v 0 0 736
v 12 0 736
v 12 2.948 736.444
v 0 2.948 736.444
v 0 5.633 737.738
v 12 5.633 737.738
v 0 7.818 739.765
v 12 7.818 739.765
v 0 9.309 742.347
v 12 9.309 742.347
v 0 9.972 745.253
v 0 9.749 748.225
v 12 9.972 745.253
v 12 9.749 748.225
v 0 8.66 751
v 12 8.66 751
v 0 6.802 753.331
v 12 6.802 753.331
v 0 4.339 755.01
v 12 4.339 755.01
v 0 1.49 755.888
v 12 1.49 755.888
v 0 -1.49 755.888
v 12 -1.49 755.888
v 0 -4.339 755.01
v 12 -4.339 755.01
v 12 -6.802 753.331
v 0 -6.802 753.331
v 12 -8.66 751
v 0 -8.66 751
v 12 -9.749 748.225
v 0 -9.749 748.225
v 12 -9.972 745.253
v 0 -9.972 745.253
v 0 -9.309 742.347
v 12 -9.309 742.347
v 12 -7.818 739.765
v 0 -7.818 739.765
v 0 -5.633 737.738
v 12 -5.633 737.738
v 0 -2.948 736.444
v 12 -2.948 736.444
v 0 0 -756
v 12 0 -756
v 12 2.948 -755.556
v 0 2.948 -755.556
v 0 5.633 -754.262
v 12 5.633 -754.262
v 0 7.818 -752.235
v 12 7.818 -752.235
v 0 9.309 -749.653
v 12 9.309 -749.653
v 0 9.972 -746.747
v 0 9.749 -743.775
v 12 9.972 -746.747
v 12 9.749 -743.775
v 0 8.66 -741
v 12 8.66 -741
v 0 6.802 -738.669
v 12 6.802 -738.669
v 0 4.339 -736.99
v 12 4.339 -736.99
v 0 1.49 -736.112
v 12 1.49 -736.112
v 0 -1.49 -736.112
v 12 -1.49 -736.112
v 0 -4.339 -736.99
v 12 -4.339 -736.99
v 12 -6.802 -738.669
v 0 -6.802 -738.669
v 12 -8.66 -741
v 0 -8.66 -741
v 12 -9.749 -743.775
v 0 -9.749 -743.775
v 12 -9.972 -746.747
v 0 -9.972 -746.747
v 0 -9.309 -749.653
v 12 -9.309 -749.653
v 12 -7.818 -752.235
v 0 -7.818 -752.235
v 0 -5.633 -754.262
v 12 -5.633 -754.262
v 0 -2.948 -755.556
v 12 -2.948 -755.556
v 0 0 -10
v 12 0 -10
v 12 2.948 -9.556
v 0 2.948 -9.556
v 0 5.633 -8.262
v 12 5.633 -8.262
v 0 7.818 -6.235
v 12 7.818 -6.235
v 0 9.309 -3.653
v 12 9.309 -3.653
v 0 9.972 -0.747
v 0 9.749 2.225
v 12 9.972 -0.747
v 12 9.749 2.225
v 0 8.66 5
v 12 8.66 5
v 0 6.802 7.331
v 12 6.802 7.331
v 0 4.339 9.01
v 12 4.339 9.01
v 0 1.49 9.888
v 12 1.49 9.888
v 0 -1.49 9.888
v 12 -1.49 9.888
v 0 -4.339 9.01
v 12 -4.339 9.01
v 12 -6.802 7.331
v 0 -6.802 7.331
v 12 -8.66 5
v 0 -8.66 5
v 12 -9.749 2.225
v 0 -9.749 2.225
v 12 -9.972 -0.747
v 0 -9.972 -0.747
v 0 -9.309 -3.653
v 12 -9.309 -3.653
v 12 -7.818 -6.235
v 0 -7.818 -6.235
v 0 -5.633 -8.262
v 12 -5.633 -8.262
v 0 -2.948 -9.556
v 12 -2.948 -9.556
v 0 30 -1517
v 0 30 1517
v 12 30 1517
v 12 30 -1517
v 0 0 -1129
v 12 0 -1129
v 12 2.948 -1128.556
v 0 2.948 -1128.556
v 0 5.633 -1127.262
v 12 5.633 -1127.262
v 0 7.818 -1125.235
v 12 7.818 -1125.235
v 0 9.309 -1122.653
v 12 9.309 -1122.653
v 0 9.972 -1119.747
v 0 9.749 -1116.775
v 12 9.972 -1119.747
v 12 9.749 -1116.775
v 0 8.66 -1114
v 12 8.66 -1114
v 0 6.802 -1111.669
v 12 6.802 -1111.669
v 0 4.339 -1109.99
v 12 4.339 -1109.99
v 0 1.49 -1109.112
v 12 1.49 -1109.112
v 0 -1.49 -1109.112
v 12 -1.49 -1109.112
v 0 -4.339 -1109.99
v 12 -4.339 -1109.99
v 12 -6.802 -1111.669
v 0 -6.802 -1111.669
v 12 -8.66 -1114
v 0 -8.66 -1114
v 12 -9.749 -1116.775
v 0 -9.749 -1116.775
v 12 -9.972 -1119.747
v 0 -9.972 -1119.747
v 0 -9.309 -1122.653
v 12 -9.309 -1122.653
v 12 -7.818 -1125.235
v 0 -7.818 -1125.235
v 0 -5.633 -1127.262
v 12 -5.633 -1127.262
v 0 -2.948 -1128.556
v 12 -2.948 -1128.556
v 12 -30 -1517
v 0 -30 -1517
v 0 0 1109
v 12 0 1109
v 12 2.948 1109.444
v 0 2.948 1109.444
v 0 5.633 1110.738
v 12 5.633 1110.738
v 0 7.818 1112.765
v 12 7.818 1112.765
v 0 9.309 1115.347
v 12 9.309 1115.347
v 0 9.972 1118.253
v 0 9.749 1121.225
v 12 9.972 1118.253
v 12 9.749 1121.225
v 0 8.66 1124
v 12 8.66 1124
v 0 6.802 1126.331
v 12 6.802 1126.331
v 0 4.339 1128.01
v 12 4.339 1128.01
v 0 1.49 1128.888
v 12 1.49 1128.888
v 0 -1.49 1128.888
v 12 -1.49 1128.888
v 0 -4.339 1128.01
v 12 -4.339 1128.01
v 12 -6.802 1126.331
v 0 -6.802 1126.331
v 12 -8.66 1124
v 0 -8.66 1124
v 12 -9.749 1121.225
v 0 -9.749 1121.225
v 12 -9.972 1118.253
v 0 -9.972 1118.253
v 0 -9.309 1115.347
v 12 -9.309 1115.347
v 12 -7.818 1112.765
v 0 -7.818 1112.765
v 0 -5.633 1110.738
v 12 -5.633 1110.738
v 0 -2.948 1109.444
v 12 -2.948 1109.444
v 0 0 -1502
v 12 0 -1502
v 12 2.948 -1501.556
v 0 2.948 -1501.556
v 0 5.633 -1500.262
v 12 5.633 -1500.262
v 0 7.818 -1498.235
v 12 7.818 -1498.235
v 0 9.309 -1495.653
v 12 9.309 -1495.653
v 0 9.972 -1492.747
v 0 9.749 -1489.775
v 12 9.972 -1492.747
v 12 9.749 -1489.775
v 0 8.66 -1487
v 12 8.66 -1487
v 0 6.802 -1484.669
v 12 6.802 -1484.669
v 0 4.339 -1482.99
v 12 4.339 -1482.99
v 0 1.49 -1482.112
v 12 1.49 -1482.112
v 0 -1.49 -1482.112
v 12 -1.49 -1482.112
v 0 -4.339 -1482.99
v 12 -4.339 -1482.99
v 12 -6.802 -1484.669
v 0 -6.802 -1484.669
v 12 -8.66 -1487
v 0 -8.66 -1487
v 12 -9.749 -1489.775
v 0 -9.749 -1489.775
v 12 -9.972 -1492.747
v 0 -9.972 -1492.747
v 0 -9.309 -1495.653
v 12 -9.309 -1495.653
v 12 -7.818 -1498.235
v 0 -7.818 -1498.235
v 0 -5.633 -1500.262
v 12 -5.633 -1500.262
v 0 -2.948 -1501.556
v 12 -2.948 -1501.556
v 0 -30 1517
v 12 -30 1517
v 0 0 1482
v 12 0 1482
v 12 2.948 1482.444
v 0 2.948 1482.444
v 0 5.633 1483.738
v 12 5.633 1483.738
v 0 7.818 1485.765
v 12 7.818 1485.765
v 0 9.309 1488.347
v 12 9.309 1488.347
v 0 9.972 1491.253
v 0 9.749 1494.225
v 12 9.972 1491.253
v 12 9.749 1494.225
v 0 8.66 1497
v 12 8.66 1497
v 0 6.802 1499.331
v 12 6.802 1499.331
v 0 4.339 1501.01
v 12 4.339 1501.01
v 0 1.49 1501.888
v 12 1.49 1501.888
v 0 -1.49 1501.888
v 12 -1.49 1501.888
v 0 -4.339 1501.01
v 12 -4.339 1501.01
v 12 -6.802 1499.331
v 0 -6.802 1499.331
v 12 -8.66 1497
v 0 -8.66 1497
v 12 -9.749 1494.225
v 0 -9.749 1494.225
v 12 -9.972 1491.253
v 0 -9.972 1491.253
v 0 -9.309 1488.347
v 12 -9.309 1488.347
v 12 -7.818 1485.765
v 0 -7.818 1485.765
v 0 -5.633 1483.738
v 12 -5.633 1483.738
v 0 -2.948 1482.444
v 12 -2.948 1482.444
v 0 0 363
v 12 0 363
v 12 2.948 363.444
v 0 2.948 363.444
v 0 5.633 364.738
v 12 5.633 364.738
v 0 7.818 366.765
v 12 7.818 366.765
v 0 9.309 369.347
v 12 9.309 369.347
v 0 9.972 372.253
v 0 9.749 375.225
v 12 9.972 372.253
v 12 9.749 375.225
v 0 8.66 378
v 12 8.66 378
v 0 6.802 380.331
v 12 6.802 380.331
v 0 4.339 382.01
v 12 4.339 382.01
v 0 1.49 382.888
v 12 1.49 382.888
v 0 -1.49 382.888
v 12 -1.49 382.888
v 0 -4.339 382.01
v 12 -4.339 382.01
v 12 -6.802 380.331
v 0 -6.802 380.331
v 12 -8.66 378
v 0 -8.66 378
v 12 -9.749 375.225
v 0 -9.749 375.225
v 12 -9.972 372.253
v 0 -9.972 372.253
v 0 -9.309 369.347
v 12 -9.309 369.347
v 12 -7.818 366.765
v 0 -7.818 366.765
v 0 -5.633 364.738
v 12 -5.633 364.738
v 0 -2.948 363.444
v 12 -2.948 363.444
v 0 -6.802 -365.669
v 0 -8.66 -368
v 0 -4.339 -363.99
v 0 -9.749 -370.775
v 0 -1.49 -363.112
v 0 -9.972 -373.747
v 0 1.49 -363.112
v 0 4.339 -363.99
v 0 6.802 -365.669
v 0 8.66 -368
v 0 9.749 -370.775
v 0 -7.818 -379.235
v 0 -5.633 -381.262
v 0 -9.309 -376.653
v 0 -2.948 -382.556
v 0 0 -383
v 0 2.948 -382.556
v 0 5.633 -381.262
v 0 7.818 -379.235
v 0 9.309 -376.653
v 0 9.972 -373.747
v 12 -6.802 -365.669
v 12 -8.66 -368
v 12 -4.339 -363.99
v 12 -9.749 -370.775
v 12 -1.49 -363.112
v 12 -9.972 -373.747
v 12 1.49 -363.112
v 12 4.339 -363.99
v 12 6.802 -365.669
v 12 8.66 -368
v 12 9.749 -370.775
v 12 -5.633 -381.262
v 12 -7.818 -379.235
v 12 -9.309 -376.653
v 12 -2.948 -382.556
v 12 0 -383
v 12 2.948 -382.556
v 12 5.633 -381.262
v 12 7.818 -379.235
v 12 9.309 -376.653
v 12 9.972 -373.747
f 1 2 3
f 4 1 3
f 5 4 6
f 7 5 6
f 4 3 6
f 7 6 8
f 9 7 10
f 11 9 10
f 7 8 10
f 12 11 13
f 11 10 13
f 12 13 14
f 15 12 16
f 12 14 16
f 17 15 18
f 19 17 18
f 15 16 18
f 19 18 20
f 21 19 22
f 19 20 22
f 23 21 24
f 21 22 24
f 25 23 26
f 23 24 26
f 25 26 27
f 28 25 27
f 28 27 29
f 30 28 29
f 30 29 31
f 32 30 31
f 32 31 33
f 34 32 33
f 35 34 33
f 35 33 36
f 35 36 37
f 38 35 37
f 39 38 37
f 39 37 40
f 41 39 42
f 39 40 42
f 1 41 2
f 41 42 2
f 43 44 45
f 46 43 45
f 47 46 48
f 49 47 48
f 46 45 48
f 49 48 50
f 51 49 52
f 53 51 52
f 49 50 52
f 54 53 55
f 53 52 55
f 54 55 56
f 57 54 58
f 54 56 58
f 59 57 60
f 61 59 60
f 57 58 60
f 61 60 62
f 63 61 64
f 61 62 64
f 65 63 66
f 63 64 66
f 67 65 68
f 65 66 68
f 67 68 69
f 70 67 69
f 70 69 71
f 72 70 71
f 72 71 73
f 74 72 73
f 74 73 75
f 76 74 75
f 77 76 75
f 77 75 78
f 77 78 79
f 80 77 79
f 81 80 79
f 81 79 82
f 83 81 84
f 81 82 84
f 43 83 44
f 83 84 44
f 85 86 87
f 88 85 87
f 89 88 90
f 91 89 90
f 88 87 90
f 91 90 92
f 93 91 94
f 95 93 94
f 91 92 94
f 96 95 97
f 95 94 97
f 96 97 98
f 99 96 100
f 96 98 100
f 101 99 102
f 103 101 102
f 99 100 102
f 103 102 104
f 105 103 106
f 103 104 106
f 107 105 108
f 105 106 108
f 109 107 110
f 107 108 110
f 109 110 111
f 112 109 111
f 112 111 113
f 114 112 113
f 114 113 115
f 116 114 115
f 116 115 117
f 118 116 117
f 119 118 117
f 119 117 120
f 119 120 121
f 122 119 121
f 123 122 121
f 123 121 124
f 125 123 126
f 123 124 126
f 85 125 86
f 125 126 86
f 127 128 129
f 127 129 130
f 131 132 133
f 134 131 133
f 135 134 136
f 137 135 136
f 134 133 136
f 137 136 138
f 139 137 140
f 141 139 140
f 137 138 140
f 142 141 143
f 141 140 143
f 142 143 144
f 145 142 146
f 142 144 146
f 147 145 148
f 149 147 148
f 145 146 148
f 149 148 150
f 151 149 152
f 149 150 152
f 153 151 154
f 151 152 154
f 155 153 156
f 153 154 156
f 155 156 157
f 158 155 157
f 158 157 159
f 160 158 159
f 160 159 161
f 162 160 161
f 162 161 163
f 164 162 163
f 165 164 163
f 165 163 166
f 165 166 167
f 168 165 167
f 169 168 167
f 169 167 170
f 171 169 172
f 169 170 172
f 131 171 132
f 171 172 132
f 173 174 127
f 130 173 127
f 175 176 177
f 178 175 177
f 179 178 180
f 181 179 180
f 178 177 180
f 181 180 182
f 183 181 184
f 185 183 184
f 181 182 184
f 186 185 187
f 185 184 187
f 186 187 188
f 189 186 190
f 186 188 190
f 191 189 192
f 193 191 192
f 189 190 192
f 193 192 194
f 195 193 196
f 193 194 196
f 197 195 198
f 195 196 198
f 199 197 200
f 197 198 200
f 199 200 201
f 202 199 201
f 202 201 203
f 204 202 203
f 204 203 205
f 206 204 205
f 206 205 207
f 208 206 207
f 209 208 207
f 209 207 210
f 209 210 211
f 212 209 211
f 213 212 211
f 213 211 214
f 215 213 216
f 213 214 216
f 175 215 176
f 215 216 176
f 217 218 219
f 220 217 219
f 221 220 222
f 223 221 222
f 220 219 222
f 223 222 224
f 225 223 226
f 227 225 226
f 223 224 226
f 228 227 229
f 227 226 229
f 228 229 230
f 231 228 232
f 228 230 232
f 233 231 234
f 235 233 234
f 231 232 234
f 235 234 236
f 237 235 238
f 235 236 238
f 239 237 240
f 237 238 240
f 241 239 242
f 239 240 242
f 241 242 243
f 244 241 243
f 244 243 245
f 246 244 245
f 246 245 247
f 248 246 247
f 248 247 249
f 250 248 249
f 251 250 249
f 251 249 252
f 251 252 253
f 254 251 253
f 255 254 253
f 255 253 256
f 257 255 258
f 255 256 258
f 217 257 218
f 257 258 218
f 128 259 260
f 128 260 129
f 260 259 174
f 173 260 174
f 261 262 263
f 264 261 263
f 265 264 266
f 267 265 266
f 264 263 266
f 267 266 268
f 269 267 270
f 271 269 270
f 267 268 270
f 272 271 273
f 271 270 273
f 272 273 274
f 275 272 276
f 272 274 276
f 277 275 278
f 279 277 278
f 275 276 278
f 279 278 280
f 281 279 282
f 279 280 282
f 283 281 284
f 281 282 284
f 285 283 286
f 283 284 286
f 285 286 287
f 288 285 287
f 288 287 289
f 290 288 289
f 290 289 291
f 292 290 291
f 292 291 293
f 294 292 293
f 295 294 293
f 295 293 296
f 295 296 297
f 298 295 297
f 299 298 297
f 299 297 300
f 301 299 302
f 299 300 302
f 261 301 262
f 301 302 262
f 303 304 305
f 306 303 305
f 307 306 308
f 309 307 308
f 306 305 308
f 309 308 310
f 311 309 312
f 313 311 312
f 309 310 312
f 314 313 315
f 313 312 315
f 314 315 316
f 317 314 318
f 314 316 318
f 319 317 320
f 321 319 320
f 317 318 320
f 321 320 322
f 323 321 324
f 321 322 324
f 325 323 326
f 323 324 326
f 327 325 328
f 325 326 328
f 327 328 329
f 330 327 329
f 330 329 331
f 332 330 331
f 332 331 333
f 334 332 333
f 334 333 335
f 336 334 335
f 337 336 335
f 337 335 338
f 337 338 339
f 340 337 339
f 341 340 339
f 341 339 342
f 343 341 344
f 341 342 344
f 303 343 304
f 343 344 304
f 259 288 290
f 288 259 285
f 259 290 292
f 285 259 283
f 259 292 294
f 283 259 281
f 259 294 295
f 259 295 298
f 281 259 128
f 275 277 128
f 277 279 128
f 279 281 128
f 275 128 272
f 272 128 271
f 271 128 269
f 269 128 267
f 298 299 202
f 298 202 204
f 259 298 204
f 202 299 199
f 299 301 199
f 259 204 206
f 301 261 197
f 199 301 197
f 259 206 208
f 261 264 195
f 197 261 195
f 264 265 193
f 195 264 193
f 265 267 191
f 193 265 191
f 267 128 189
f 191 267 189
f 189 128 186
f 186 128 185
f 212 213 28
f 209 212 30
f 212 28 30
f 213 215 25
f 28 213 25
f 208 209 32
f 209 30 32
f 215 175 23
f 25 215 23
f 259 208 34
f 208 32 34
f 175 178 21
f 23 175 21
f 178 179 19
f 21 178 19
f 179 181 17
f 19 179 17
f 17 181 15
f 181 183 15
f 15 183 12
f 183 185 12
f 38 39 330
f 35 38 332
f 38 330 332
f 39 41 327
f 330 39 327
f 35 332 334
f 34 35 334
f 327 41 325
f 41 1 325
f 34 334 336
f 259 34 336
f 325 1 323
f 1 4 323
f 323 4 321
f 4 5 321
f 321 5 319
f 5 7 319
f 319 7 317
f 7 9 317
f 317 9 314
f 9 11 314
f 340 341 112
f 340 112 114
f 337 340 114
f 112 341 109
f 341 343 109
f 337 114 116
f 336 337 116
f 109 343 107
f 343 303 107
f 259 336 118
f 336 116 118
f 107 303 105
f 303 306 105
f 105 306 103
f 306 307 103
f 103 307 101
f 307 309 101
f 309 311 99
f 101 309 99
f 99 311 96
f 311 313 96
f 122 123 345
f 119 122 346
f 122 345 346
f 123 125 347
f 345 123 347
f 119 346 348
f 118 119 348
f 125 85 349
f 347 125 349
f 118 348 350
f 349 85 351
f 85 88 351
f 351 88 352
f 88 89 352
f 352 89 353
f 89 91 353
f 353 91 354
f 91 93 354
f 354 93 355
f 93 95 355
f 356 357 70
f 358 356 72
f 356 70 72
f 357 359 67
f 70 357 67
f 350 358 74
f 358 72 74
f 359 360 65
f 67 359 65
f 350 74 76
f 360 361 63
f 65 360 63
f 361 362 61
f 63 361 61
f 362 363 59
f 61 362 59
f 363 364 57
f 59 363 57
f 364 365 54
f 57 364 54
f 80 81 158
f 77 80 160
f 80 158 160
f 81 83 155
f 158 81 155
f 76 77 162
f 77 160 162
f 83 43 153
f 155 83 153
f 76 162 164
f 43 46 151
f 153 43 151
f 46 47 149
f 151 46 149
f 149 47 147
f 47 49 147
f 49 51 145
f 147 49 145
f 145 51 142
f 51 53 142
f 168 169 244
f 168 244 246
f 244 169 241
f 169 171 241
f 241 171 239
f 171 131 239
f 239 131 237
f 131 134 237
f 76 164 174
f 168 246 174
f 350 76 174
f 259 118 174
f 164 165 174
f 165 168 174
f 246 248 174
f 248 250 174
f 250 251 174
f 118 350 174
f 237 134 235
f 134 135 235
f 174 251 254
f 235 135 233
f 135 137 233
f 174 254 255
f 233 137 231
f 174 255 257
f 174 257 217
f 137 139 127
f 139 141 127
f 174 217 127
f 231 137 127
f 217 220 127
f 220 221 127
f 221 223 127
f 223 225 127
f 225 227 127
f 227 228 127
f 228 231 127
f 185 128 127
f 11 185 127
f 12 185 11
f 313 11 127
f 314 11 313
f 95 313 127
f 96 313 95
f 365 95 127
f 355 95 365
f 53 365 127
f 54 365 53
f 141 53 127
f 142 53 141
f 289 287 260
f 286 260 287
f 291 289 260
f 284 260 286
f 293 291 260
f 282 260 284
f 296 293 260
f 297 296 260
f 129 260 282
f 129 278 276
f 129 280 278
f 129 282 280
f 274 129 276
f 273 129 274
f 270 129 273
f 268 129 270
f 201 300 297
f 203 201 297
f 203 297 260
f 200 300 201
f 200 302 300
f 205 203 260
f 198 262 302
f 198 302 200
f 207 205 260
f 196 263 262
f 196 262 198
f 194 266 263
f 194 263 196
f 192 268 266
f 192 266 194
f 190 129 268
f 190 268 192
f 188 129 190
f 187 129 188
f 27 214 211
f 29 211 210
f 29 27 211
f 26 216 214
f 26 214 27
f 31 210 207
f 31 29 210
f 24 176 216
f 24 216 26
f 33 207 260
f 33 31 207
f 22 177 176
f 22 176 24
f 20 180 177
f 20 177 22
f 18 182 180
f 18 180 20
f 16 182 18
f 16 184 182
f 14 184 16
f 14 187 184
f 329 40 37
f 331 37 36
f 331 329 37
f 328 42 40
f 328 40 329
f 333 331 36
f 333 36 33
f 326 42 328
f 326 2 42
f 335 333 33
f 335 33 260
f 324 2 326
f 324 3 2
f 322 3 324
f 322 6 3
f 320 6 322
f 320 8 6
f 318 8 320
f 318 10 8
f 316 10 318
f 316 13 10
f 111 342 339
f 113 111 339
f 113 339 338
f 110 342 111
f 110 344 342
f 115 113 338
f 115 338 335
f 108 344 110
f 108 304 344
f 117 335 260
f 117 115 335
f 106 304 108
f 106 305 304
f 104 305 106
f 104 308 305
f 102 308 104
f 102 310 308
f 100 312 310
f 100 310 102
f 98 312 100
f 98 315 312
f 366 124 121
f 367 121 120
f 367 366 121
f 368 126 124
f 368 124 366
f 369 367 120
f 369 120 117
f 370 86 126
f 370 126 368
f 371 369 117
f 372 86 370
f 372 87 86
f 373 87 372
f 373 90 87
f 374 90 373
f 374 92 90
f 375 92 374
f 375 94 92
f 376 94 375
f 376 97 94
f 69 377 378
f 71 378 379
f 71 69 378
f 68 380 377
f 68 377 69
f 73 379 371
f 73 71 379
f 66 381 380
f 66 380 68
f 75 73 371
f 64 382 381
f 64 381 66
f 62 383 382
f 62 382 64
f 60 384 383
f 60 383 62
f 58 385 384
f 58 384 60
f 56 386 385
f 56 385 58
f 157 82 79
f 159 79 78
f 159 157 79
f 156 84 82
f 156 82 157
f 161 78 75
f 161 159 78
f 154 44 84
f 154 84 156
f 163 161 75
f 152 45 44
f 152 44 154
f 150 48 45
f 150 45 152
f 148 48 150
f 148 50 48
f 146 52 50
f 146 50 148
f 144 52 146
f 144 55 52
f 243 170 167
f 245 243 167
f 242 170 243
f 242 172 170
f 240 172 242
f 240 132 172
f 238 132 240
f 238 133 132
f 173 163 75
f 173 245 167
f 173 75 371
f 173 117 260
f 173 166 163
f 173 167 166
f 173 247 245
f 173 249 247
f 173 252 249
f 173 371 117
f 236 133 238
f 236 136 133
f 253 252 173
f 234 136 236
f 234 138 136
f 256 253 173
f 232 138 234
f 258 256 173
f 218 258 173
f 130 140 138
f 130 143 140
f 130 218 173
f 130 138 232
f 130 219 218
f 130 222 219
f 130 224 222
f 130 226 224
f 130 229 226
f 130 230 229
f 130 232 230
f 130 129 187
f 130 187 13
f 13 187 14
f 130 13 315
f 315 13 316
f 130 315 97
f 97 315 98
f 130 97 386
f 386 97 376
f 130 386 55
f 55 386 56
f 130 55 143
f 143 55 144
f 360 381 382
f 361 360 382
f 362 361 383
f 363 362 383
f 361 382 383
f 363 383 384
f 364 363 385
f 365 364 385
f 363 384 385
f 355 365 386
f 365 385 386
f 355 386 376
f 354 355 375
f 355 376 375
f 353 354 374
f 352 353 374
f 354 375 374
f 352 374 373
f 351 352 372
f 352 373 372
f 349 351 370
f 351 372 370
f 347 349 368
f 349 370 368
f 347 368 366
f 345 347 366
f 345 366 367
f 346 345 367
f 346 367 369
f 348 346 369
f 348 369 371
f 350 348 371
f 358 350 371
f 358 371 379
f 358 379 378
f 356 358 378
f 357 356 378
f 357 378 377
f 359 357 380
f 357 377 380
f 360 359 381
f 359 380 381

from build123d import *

# Parameters (mm, degrees)
SKETCH1_W           = 3034
SKETCH1_H           = 60
BOSS_EXTRUDE1_DEPTH = 12
SKETCH2_R           = 10
CUT_EXTRUDE1_DEPTH  = 12
LPATTERN1_COUNT     = 9
LPATTERN1_PITCH     = 373


with BuildPart() as part:
    # Sketch1 → Boss-Extrude1 (new body)
    with BuildSketch(Plane(origin=(0, 0, 0), x_dir=(0, 0, -1), z_dir=(1, 0, 0))):
        Rectangle(SKETCH1_W, SKETCH1_H)
    extrude(amount=BOSS_EXTRUDE1_DEPTH)

    # Sketch2 → Cut-Extrude1 (cut)
    with BuildSketch(Plane(origin=(12, 0, 0), x_dir=(0, 0, -1), z_dir=(1, 0, 0))):
        with Locations((-1492, 0)):
            Circle(SKETCH2_R)
    cut_extrude1 = extrude(amount=-CUT_EXTRUDE1_DEPTH, mode=Mode.SUBTRACT)

    # LPattern1: Cut-Extrude1 ×9
    with Locations(*[(0, 0, -i * LPATTERN1_PITCH) for i in range(1, LPATTERN1_COUNT)]):
        add(cut_extrude1, mode=Mode.SUBTRACT)


solid = part.part
